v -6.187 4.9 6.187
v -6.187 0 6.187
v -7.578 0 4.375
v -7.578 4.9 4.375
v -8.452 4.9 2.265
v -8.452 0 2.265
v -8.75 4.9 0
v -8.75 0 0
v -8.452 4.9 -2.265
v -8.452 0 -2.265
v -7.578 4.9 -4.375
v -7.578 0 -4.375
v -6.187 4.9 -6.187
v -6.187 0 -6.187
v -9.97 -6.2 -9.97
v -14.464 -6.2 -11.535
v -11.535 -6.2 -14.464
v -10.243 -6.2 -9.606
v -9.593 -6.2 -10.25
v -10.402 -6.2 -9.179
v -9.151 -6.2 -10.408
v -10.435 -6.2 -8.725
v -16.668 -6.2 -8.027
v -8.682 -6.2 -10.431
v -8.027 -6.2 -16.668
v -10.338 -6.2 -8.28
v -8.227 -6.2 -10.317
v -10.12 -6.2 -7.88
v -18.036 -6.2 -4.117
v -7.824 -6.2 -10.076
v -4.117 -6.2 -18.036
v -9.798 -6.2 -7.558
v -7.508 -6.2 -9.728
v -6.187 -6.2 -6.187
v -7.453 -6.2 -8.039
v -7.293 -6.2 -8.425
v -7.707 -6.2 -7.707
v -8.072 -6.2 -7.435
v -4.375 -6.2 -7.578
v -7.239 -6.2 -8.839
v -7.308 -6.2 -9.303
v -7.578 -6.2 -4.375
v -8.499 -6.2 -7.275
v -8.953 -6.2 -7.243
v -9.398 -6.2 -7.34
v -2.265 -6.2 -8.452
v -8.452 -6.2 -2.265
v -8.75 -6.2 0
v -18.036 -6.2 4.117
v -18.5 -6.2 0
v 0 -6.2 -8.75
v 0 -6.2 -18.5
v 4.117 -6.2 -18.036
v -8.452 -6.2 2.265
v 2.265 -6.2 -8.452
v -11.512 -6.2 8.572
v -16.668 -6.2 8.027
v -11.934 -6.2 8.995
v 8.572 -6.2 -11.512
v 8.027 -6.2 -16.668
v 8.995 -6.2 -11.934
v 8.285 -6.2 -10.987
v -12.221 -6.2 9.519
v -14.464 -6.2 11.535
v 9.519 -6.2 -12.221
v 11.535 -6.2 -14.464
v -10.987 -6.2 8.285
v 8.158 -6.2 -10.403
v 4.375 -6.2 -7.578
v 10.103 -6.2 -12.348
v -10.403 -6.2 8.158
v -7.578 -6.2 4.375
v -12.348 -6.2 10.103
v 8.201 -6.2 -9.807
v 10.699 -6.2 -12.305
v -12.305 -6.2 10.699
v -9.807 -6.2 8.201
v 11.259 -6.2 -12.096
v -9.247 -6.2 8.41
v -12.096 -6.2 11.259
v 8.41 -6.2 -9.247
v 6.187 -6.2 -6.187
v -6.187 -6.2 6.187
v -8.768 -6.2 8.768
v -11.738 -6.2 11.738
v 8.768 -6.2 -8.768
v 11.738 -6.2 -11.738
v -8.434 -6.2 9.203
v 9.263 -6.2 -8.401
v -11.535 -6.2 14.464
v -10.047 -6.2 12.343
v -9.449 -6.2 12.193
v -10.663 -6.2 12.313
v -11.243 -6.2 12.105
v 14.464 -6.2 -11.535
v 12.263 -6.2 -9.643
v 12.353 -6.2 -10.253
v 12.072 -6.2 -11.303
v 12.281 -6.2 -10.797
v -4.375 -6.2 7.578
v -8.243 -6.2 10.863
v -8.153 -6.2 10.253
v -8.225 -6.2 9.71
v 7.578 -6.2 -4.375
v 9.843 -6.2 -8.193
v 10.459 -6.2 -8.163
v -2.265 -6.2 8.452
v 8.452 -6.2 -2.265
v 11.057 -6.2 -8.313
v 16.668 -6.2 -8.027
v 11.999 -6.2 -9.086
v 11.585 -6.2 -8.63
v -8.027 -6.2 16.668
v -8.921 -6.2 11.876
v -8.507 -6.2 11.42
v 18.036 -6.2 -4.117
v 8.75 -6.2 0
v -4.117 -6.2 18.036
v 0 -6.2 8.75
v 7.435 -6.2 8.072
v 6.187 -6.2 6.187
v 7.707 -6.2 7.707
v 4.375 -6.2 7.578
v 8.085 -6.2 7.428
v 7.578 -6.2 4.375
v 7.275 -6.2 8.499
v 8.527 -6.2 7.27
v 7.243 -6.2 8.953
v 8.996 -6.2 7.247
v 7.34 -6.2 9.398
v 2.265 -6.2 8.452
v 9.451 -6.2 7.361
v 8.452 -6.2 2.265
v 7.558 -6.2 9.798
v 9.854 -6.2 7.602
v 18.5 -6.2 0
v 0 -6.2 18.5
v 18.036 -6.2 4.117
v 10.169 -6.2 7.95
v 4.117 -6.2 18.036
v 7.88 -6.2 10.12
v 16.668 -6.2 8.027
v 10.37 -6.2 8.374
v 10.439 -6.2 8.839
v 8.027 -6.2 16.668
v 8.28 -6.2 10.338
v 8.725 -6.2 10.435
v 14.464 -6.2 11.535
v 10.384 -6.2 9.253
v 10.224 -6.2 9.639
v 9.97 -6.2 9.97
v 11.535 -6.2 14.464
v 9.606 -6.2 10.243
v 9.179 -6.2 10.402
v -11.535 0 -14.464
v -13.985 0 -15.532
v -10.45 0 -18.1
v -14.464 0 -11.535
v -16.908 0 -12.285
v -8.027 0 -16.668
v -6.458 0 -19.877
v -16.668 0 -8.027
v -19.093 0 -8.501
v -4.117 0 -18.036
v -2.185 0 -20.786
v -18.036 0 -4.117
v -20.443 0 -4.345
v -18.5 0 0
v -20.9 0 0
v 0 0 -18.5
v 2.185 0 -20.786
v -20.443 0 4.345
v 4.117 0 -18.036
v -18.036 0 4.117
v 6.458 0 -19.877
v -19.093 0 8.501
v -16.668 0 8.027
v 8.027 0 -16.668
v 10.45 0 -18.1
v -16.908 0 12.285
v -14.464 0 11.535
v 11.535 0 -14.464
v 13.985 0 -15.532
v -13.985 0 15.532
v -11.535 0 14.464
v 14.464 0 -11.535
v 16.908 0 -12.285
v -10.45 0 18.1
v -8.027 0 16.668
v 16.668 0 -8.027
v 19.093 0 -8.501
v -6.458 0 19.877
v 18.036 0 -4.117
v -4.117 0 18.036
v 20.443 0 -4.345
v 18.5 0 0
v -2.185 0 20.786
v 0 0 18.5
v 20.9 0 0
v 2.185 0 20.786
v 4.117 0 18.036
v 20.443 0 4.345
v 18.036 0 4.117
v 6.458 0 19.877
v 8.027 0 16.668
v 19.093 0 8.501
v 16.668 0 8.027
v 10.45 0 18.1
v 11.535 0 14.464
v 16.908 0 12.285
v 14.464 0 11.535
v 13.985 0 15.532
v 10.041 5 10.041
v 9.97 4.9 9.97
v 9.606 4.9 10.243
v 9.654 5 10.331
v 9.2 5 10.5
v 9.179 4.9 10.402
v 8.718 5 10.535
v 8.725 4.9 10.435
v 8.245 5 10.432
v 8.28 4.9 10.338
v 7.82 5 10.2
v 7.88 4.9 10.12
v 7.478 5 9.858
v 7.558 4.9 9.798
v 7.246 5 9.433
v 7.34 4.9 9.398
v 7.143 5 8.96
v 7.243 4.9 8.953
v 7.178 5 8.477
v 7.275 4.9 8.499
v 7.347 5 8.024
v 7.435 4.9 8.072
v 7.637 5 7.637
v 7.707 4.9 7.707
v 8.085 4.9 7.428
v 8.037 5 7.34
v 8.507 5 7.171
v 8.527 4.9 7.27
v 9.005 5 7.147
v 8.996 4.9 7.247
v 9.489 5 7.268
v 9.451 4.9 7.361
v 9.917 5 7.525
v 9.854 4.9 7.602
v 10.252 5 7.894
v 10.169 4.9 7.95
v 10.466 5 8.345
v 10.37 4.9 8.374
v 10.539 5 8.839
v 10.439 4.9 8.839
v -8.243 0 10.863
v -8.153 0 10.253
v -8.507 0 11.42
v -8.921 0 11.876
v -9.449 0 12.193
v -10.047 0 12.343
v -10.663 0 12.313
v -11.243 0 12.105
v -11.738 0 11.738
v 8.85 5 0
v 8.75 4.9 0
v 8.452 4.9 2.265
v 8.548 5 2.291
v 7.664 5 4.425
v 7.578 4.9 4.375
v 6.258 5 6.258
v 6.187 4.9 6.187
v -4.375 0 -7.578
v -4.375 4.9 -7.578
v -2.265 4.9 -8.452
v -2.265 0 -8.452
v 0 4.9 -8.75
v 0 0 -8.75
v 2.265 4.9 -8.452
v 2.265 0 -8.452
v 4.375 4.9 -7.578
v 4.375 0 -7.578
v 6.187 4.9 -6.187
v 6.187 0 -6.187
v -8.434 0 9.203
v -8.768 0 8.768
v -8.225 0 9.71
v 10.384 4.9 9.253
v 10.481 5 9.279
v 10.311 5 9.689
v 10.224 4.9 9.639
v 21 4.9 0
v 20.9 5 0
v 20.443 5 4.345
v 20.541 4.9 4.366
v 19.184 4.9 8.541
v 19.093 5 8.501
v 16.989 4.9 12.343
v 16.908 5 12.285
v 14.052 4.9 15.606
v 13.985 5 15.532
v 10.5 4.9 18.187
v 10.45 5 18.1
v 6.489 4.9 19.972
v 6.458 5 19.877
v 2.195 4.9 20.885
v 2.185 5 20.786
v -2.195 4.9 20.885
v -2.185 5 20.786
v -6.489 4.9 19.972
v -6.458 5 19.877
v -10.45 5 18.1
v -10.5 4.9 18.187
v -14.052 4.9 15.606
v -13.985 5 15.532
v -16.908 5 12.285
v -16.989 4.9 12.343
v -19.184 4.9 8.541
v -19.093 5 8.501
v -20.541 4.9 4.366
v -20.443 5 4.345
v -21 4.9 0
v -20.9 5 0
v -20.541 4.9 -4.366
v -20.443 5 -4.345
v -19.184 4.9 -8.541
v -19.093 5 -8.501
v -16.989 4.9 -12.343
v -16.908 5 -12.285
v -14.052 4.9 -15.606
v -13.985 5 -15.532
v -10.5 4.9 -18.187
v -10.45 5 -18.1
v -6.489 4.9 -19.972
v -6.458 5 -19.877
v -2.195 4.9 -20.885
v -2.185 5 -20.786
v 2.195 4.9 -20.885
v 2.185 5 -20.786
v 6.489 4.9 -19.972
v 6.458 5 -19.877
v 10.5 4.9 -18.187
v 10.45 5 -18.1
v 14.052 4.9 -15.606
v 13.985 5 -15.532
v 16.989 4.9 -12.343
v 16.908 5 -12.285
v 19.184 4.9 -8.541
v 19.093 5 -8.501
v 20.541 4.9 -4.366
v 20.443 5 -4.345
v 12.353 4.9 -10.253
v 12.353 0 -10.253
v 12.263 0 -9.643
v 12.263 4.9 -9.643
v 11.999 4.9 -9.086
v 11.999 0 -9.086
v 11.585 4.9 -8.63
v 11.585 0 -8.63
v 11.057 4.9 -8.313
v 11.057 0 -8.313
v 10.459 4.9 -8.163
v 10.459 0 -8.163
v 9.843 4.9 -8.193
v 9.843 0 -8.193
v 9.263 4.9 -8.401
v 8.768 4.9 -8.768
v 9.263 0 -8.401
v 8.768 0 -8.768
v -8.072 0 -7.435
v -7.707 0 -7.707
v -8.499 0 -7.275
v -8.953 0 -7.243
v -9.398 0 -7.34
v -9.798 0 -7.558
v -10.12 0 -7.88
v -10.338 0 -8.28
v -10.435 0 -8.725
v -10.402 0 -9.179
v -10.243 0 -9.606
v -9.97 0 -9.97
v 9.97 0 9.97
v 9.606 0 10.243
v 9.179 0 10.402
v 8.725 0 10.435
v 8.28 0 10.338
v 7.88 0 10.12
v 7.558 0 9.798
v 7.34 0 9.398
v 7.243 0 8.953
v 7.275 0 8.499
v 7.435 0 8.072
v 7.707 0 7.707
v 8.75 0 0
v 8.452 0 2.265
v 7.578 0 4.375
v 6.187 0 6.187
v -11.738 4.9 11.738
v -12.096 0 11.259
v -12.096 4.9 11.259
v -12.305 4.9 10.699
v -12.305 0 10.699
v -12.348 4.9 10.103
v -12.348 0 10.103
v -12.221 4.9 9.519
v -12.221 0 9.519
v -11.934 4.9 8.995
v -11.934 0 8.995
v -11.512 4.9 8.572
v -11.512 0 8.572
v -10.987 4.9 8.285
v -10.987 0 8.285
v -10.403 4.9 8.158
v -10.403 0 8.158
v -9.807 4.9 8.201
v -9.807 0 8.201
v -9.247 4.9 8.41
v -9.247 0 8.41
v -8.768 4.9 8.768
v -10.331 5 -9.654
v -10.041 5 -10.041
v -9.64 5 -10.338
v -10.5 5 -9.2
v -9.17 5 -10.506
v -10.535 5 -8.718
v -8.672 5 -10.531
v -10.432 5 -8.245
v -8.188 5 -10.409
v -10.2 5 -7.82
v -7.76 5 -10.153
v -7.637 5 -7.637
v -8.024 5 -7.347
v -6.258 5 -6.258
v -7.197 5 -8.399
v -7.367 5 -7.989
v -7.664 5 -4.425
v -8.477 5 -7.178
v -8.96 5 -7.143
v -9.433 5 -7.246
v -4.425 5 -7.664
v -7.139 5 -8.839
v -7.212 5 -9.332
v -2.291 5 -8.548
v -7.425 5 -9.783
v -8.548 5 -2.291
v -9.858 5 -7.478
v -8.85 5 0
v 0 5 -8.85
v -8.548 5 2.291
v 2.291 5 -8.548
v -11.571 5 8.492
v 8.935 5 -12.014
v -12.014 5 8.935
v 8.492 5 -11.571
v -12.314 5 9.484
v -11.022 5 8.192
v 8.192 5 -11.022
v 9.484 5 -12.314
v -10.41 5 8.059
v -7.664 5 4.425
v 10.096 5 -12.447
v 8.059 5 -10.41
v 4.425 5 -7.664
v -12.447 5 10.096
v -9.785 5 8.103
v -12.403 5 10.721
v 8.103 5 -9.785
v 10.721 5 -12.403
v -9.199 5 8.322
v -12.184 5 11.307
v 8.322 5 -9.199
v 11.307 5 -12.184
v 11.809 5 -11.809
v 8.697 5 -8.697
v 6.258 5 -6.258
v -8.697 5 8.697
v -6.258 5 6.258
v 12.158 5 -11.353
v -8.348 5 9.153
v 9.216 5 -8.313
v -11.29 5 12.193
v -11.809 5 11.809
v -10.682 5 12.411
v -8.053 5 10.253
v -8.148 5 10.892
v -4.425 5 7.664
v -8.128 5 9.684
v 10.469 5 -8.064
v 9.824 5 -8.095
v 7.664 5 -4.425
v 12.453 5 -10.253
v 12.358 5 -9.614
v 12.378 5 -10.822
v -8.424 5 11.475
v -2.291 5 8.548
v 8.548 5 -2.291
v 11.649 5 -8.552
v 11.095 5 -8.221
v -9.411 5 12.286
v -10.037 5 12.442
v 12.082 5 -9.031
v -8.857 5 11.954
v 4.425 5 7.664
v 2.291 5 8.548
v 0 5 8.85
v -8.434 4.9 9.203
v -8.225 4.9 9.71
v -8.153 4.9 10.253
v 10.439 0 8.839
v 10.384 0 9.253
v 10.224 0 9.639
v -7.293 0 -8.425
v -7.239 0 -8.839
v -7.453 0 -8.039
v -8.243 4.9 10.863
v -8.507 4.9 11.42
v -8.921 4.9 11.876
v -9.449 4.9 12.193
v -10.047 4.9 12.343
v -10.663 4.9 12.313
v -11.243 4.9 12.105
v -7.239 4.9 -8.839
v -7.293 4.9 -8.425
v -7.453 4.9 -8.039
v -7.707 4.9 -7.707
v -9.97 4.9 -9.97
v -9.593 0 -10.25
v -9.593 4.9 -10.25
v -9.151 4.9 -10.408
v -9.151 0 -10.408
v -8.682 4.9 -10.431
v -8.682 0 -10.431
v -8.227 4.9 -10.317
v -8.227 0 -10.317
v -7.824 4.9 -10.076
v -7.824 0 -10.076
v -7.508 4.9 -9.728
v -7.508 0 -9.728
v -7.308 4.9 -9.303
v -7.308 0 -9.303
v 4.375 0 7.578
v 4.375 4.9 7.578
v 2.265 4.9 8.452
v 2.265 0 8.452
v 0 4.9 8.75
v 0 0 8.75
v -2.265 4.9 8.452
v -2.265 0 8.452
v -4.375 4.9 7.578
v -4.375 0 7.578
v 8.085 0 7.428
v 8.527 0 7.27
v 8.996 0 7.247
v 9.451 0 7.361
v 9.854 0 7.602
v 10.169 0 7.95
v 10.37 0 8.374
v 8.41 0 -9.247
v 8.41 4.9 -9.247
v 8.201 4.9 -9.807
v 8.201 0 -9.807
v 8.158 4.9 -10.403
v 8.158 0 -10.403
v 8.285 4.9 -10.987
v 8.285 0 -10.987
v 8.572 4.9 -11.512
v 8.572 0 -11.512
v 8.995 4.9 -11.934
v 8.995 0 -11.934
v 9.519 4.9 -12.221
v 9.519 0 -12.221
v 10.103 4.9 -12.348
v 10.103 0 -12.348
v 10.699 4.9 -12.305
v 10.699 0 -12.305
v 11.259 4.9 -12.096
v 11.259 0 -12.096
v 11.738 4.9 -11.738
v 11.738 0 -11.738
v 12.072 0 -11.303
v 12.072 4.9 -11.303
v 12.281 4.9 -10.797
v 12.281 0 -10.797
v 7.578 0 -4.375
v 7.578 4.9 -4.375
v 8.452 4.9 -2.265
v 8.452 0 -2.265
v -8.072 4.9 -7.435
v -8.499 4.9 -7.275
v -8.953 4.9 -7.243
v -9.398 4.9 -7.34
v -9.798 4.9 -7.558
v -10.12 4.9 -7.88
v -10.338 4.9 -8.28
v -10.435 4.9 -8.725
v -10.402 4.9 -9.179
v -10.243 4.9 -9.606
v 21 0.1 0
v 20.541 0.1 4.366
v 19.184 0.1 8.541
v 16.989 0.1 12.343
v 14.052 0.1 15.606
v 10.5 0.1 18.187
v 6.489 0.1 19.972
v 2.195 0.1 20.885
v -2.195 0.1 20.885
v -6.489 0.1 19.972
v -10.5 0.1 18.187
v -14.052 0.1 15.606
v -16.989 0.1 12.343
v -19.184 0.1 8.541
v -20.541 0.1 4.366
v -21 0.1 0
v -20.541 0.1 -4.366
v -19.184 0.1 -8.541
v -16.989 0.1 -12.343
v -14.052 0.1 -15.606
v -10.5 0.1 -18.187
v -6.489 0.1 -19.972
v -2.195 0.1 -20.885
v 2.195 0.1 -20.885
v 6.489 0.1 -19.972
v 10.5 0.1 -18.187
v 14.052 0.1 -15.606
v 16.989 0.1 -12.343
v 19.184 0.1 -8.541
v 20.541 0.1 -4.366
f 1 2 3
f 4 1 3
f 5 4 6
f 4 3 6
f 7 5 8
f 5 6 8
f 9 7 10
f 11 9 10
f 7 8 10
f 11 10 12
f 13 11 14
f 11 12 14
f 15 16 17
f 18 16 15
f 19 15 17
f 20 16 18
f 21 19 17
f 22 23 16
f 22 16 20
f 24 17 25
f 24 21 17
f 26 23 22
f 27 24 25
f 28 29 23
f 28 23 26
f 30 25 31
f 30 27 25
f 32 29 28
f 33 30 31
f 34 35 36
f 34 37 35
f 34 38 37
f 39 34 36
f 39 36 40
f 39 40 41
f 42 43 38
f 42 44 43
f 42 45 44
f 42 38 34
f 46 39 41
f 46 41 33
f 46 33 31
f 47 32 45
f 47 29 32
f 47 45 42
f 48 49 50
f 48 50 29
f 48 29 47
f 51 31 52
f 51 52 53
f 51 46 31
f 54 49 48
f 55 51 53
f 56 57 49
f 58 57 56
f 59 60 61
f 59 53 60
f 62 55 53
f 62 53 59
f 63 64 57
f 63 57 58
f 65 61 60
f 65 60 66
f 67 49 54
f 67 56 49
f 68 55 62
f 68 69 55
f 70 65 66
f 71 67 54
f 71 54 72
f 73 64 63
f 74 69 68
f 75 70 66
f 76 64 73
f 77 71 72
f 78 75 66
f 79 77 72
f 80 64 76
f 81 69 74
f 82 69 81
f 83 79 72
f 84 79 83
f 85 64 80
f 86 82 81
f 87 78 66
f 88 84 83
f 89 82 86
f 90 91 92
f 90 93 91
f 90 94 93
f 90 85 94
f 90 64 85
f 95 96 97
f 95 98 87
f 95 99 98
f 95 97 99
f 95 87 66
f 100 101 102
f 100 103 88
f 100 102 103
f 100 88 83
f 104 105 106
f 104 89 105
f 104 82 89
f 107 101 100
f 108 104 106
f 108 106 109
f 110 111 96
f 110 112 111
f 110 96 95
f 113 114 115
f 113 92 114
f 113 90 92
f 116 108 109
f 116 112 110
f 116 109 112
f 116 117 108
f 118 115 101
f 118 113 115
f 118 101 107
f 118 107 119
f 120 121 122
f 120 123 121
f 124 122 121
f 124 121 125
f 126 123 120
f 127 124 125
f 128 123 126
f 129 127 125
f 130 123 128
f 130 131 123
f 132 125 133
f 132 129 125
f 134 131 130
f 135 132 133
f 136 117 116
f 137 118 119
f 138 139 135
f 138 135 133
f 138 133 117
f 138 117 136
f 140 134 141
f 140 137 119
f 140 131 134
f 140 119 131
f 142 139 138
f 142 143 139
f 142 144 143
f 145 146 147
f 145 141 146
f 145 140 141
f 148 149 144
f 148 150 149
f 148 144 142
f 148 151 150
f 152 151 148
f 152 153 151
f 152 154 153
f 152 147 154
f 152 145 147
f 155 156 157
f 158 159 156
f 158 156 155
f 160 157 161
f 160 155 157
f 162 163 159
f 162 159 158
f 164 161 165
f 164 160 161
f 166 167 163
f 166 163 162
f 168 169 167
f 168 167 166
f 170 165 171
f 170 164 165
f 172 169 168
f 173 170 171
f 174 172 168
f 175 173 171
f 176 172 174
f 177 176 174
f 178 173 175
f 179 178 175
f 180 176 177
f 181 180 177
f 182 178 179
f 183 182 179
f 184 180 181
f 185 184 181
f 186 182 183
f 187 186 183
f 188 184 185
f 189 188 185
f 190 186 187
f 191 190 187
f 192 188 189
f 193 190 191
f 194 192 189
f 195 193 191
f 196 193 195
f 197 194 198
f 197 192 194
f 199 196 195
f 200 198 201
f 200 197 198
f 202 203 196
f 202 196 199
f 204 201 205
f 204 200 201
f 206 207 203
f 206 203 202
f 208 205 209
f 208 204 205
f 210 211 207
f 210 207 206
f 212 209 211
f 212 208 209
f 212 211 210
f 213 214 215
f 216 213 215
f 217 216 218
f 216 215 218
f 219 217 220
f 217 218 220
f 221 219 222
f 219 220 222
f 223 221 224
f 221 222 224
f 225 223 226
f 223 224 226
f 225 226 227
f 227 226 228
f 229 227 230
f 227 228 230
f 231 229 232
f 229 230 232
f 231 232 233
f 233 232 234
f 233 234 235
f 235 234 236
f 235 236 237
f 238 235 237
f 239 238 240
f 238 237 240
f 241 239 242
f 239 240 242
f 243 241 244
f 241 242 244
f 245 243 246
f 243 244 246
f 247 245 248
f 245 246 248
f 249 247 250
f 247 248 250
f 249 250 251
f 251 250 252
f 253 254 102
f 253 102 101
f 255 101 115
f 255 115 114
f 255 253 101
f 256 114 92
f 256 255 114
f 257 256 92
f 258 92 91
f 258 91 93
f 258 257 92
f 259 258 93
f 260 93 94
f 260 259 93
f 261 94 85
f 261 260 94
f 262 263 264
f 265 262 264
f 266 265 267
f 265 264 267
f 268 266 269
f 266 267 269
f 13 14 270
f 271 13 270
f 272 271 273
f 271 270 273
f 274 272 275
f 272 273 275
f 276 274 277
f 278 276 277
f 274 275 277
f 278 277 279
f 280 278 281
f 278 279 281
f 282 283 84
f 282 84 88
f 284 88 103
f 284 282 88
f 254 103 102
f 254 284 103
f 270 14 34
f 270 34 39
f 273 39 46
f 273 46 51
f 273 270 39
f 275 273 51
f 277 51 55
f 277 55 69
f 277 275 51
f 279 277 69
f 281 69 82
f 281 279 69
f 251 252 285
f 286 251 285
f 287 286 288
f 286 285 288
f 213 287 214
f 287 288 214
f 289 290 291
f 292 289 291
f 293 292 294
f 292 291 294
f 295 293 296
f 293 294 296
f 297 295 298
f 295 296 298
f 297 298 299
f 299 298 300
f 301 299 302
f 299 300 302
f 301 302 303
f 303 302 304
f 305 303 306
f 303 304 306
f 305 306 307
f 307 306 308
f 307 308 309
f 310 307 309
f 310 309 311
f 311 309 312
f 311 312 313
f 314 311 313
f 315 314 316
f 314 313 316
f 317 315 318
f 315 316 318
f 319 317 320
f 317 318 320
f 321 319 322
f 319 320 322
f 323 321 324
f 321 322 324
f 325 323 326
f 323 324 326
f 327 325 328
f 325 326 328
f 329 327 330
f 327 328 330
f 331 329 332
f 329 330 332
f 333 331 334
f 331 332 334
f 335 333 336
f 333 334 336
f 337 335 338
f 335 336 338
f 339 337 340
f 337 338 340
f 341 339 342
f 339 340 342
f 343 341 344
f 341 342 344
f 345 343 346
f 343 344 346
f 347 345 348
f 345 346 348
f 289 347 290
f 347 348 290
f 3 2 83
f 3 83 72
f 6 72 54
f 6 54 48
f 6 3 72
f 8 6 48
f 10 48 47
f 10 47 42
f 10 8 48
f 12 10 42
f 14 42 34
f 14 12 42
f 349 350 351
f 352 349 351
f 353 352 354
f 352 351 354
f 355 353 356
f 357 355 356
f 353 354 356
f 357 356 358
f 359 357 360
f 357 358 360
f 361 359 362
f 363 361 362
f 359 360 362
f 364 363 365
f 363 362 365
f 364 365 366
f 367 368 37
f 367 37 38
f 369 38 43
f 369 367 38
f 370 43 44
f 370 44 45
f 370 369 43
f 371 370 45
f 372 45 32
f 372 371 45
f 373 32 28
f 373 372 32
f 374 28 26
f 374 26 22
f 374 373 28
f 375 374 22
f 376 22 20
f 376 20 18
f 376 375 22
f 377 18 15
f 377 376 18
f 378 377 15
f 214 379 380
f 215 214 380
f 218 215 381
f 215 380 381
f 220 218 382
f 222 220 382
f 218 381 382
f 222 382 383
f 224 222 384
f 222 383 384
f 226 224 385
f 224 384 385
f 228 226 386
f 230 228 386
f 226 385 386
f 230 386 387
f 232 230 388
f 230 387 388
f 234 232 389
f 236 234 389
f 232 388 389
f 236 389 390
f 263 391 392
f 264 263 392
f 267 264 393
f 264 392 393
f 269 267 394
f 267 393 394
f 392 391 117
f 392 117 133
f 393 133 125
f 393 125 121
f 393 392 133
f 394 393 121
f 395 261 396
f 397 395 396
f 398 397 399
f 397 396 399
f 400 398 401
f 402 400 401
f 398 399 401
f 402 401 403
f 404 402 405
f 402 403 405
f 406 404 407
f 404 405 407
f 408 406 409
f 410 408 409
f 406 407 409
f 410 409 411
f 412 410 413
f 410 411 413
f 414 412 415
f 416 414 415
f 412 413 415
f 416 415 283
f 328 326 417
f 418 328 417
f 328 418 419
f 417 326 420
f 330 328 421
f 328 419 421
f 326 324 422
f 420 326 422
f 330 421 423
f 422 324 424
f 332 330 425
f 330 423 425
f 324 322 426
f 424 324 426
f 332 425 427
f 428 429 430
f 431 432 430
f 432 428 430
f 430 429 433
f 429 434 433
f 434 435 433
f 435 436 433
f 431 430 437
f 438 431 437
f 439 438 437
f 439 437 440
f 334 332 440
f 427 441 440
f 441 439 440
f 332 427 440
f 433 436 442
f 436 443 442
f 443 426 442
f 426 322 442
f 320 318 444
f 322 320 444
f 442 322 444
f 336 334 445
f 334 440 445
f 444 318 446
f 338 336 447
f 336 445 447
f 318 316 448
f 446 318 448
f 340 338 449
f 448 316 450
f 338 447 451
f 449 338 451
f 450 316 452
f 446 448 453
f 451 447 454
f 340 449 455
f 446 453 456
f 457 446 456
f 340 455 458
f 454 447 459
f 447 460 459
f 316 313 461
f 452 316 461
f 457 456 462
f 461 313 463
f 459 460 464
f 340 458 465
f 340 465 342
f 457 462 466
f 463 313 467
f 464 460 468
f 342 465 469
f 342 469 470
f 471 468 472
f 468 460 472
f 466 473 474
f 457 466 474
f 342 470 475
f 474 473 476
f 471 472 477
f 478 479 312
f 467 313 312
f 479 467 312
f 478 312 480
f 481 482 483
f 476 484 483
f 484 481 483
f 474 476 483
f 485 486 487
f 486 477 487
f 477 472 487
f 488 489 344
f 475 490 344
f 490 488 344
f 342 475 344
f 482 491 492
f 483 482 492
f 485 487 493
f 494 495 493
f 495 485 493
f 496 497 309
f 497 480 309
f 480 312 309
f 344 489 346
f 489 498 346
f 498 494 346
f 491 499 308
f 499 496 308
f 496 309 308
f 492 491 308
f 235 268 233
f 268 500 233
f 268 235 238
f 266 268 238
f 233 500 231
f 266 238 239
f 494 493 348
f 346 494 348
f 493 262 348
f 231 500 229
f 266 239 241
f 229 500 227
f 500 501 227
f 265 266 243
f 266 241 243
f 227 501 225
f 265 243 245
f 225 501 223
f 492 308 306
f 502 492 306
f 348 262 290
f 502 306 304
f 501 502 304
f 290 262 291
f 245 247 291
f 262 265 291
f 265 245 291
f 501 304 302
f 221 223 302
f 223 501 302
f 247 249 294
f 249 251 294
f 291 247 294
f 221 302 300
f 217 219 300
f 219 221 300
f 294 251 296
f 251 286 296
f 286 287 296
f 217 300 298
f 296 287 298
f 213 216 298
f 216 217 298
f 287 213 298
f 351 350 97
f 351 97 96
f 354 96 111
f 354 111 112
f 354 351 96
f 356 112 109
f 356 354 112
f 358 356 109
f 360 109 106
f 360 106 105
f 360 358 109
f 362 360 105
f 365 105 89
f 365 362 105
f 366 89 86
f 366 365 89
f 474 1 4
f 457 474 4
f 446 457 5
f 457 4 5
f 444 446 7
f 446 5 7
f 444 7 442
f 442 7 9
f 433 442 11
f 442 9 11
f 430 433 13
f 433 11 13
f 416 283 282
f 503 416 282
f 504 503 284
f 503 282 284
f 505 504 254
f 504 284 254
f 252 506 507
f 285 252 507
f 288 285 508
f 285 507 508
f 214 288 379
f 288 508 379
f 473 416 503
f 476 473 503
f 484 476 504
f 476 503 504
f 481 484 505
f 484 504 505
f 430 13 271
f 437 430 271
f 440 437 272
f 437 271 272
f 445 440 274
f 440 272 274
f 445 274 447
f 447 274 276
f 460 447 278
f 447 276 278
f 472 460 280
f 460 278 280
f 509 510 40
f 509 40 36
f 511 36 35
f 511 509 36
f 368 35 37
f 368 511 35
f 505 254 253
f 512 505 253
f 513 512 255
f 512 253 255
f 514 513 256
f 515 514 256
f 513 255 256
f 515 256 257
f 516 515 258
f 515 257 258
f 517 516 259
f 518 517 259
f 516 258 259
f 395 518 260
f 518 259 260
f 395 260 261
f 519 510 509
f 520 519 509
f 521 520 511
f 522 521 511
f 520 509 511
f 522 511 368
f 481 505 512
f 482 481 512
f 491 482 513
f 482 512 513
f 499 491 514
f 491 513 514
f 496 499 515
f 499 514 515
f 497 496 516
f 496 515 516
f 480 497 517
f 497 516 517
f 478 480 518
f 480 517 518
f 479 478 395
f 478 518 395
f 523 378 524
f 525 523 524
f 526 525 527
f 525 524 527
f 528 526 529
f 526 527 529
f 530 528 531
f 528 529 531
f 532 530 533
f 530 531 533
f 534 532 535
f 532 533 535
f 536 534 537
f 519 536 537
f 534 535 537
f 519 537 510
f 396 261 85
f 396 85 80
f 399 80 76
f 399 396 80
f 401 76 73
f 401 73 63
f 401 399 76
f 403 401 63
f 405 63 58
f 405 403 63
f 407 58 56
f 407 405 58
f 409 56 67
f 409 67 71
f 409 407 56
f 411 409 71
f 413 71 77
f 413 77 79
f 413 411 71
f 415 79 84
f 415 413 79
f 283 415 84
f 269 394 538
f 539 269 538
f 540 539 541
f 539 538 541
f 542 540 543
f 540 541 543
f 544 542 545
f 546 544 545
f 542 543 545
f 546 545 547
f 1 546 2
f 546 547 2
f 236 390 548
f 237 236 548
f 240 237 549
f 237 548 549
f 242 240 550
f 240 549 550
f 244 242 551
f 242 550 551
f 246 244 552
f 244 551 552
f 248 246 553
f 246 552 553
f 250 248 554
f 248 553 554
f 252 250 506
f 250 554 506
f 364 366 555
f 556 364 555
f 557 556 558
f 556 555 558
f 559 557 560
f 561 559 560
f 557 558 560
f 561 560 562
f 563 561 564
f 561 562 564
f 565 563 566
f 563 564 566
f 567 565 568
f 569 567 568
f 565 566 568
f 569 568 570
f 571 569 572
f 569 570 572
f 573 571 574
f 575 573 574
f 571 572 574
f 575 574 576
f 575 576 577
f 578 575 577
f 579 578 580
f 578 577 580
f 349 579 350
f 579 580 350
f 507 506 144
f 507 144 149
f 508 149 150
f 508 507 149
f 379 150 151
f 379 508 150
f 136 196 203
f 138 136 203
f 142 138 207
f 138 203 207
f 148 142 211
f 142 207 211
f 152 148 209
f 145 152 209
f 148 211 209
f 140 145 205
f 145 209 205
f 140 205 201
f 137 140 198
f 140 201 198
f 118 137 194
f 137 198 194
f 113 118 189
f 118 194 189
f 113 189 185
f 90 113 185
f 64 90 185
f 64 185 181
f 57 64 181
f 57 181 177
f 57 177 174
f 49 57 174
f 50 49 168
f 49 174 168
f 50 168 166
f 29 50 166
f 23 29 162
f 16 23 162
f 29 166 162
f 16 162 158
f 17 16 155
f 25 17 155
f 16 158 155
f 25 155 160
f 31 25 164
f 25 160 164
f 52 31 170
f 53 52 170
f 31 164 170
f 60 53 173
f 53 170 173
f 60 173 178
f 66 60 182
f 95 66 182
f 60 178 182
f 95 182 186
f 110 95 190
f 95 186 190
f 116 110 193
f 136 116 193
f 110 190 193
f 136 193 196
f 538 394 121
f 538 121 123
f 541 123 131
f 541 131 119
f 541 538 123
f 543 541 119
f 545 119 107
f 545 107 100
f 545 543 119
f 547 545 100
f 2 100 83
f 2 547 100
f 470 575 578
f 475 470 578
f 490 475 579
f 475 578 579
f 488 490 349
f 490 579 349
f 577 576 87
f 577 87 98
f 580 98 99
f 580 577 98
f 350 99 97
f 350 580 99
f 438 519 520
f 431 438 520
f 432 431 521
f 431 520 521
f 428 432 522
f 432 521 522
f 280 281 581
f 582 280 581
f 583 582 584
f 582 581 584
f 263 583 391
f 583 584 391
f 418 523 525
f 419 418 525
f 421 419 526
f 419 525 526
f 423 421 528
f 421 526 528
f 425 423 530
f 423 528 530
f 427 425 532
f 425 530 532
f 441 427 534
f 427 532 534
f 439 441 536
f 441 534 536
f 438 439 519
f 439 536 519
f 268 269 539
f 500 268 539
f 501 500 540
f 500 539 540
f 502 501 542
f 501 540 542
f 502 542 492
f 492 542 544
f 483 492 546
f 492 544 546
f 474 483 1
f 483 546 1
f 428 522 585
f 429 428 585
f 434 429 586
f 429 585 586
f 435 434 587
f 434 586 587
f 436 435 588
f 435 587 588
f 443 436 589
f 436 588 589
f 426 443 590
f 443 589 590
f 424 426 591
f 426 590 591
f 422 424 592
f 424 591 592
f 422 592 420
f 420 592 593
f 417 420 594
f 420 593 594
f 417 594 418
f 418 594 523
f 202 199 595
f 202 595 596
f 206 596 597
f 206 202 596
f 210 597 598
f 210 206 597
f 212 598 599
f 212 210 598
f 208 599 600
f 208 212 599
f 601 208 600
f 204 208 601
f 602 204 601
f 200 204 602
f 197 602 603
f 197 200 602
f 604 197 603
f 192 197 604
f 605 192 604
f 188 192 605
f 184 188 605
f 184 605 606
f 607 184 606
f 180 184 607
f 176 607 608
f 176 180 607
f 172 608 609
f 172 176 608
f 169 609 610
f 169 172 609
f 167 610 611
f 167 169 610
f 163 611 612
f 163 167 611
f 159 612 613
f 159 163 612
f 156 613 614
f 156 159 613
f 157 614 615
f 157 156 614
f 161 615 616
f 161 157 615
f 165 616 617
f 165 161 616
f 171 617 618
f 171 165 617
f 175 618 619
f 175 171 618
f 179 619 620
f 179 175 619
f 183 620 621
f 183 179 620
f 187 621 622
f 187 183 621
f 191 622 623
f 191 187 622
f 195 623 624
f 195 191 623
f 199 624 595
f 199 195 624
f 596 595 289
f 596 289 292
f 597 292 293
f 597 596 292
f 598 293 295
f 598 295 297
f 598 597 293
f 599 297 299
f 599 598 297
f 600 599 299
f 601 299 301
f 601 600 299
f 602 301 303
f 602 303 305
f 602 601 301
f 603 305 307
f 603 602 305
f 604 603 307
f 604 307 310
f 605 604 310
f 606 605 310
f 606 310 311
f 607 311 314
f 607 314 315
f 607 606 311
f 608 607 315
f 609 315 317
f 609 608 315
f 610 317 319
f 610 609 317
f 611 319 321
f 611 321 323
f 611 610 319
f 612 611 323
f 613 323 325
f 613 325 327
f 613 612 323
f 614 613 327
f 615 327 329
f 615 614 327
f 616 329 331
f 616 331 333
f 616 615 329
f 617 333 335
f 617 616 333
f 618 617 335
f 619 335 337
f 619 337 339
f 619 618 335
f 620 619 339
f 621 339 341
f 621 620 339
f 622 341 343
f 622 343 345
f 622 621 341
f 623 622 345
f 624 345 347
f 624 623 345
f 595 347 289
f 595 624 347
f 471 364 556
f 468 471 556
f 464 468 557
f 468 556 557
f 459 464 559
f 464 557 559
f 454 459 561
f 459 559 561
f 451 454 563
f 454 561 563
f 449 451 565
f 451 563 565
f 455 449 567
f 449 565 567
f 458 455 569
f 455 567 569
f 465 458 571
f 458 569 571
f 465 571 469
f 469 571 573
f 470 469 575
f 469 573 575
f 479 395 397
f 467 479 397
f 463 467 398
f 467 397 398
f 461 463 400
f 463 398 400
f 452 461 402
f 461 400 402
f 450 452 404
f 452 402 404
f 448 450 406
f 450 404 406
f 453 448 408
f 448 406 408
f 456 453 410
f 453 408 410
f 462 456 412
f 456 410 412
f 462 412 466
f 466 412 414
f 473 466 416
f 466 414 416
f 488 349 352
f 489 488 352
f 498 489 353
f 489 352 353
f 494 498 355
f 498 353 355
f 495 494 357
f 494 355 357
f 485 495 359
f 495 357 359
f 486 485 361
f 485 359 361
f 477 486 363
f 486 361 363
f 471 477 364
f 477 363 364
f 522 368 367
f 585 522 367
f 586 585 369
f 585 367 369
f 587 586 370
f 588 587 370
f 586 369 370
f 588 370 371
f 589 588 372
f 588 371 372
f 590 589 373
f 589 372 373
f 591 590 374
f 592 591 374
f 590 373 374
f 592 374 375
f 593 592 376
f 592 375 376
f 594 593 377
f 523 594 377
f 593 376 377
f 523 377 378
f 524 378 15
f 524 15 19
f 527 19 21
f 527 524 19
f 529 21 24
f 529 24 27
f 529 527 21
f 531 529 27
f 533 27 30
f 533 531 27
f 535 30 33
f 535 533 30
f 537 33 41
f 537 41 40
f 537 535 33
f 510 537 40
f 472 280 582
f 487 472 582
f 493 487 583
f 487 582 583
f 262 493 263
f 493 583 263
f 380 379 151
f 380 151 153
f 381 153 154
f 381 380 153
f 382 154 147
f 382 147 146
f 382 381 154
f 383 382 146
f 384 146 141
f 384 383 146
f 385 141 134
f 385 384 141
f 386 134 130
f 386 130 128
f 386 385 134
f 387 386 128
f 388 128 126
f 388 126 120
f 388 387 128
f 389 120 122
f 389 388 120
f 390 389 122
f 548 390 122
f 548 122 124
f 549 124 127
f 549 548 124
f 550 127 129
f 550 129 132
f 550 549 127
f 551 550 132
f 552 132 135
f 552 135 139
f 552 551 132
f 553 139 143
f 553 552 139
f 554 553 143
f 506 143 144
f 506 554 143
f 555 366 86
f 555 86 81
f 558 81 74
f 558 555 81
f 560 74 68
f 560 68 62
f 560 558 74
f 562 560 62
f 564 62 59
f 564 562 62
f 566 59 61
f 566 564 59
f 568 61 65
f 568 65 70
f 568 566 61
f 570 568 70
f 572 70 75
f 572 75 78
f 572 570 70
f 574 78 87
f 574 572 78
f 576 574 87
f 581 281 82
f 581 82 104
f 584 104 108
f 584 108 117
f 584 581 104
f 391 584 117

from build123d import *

# Parameters (mm, degrees)
F0_R          = 21
F1_DEPTH      = 5
F2_R          = 18.5
F3_DEPTH      = 6.2
F5_DEPTH      = 6.2
F5_DEPTH_BACK = 5
F6_SIZE       = 0.1


with BuildPart() as f1:
    # F0 (on Front) → F1 (new body)
    with BuildSketch(Plane.XZ):
        Circle(F0_R)
    extrude(amount=-F1_DEPTH)

    # F2 (on Front) → F3 (join)
    with BuildSketch(Plane.XZ):
        Circle(F2_R)
    extrude(amount=F3_DEPTH)

    # F4 (on Front) → F5 (cut, two sides)
    with BuildSketch(Plane.XZ) as f5_sk:
        with BuildLine():
            ThreePointArc((7.7074639149, 7.7074639149), (9.4511282566, 7.3606275128), (10.4388347648, 8.8388347648))
            ThreePointArc((10.4388347648, 8.8388347648), (10.3170420168, 9.4511282566), (9.9702056147, 9.9702056147))
            Line((9.9702056147, 9.9702056147), (7.7074639149, 7.7074639149))
        make_face()
        with BuildLine():
            ThreePointArc((12.3530483272, -10.2530483272), (11.0566835352, -8.3129013089), (8.7681240867, -8.7681240867))
            Line((8.7681240867, -8.7681240867), (11.7379725677, -11.7379725677))
            ThreePointArc((11.7379725677, -11.7379725677), (12.1931953455, -11.0566835352), (12.3530483272, -10.2530483272))
        make_face()
        with BuildLine():
            Line((11.7379725677, -11.7379725677), (8.7681240867, -8.7681240867))
            ThreePointArc((8.7681240867, -8.7681240867), (8.7681240867, -11.7379725677), (11.7379725677, -11.7379725677))
        make_face()
        with BuildLine():
            ThreePointArc((-7.2388347648, -8.8388347648), (-7.3606275128, -8.226541273), (-7.7074639149, -7.7074639149))
            Line((-7.7074639149, -7.7074639149), (-9.9702056147, -9.9702056147))
            ThreePointArc((-9.9702056147, -9.9702056147), (-8.226541273, -10.3170420168), (-7.2388347648, -8.8388347648))
        make_face()
        with BuildLine():
            Line((-9.9702056147, -9.9702056147), (-7.7074639149, -7.7074639149))
            ThreePointArc((-7.7074639149, -7.7074639149), (-9.9702056147, -7.7074639149), (-9.9702056147, -9.9702056147))
        make_face()
        with BuildLine():
            ThreePointArc((-11.7379725677, 11.7379725677), (-11.7379725677, 8.7681240867), (-8.7681240867, 8.7681240867))
            Line((-8.7681240867, 8.7681240867), (-11.7379725677, 11.7379725677))
        make_face()
        with BuildLine():
            Line((-11.7379725677, 11.7379725677), (-8.7681240867, 8.7681240867))
            ThreePointArc((-8.7681240867, 8.7681240867), (-8.3129013089, 9.4494131192), (-8.1530483272, 10.2530483272))
            ThreePointArc((-8.1530483272, 10.2530483272), (-9.4494131192, 12.1931953455), (-11.7379725677, 11.7379725677))
        make_face()
        with BuildLine():
            ThreePointArc((8.75, 0), (8.0839459095, 3.3484800332), (6.1871843354, 6.1871843354))
            Line((6.1871843354, 6.1871843354), (0, 0))
            Line((0, 0), (6.1871843354, -6.1871843354))
            ThreePointArc((6.1871843354, -6.1871843354), (8.0839459095, -3.3484800332), (8.75, 0))
        make_face()
        with BuildLine():
            Line((0, 0), (6.1871843354, 6.1871843354))
            ThreePointArc((6.1871843354, 6.1871843354), (0, 8.75), (-6.1871843354, 6.1871843354))
            Line((-6.1871843354, 6.1871843354), (0, 0))
        make_face()
        with BuildLine():
            Line((7.7074639149, 7.7074639149), (9.9702056147, 9.9702056147))
            ThreePointArc((9.9702056147, 9.9702056147), (7.7074639149, 9.9702056147), (7.7074639149, 7.7074639149))
        make_face()
        with BuildLine():
            Line((0, 0), (-6.1871843354, 6.1871843354))
            ThreePointArc((-6.1871843354, 6.1871843354), (-8.75, 0), (-6.1871843354, -6.1871843354))
            Line((-6.1871843354, -6.1871843354), (0, 0))
        make_face()
        with BuildLine():
            Line((6.1871843354, -6.1871843354), (0, 0))
            Line((0, 0), (-6.1871843354, -6.1871843354))
            ThreePointArc((-6.1871843354, -6.1871843354), (0, -8.75), (6.1871843354, -6.1871843354))
        make_face()
    extrude(amount=F5_DEPTH, mode=Mode.SUBTRACT)
    extrude(f5_sk.sketch, amount=-F5_DEPTH_BACK, mode=Mode.SUBTRACT)

    # F6
    f6_edges = [f1.edges().sort_by_distance(p)[0] for p in [
        (-21, 5, 0),
        (-9.970206, 5, -9.970206),
        (11.737973, 5, -11.737973),
        (6.187184, 5, 6.187184),
        (-11.737973, 5, 11.737973),
        (7.707464, 5, 7.707464),
        (-21, 0, 0),
    ]]
    chamfer(f6_edges, length=F6_SIZE)


solid = f1.part
